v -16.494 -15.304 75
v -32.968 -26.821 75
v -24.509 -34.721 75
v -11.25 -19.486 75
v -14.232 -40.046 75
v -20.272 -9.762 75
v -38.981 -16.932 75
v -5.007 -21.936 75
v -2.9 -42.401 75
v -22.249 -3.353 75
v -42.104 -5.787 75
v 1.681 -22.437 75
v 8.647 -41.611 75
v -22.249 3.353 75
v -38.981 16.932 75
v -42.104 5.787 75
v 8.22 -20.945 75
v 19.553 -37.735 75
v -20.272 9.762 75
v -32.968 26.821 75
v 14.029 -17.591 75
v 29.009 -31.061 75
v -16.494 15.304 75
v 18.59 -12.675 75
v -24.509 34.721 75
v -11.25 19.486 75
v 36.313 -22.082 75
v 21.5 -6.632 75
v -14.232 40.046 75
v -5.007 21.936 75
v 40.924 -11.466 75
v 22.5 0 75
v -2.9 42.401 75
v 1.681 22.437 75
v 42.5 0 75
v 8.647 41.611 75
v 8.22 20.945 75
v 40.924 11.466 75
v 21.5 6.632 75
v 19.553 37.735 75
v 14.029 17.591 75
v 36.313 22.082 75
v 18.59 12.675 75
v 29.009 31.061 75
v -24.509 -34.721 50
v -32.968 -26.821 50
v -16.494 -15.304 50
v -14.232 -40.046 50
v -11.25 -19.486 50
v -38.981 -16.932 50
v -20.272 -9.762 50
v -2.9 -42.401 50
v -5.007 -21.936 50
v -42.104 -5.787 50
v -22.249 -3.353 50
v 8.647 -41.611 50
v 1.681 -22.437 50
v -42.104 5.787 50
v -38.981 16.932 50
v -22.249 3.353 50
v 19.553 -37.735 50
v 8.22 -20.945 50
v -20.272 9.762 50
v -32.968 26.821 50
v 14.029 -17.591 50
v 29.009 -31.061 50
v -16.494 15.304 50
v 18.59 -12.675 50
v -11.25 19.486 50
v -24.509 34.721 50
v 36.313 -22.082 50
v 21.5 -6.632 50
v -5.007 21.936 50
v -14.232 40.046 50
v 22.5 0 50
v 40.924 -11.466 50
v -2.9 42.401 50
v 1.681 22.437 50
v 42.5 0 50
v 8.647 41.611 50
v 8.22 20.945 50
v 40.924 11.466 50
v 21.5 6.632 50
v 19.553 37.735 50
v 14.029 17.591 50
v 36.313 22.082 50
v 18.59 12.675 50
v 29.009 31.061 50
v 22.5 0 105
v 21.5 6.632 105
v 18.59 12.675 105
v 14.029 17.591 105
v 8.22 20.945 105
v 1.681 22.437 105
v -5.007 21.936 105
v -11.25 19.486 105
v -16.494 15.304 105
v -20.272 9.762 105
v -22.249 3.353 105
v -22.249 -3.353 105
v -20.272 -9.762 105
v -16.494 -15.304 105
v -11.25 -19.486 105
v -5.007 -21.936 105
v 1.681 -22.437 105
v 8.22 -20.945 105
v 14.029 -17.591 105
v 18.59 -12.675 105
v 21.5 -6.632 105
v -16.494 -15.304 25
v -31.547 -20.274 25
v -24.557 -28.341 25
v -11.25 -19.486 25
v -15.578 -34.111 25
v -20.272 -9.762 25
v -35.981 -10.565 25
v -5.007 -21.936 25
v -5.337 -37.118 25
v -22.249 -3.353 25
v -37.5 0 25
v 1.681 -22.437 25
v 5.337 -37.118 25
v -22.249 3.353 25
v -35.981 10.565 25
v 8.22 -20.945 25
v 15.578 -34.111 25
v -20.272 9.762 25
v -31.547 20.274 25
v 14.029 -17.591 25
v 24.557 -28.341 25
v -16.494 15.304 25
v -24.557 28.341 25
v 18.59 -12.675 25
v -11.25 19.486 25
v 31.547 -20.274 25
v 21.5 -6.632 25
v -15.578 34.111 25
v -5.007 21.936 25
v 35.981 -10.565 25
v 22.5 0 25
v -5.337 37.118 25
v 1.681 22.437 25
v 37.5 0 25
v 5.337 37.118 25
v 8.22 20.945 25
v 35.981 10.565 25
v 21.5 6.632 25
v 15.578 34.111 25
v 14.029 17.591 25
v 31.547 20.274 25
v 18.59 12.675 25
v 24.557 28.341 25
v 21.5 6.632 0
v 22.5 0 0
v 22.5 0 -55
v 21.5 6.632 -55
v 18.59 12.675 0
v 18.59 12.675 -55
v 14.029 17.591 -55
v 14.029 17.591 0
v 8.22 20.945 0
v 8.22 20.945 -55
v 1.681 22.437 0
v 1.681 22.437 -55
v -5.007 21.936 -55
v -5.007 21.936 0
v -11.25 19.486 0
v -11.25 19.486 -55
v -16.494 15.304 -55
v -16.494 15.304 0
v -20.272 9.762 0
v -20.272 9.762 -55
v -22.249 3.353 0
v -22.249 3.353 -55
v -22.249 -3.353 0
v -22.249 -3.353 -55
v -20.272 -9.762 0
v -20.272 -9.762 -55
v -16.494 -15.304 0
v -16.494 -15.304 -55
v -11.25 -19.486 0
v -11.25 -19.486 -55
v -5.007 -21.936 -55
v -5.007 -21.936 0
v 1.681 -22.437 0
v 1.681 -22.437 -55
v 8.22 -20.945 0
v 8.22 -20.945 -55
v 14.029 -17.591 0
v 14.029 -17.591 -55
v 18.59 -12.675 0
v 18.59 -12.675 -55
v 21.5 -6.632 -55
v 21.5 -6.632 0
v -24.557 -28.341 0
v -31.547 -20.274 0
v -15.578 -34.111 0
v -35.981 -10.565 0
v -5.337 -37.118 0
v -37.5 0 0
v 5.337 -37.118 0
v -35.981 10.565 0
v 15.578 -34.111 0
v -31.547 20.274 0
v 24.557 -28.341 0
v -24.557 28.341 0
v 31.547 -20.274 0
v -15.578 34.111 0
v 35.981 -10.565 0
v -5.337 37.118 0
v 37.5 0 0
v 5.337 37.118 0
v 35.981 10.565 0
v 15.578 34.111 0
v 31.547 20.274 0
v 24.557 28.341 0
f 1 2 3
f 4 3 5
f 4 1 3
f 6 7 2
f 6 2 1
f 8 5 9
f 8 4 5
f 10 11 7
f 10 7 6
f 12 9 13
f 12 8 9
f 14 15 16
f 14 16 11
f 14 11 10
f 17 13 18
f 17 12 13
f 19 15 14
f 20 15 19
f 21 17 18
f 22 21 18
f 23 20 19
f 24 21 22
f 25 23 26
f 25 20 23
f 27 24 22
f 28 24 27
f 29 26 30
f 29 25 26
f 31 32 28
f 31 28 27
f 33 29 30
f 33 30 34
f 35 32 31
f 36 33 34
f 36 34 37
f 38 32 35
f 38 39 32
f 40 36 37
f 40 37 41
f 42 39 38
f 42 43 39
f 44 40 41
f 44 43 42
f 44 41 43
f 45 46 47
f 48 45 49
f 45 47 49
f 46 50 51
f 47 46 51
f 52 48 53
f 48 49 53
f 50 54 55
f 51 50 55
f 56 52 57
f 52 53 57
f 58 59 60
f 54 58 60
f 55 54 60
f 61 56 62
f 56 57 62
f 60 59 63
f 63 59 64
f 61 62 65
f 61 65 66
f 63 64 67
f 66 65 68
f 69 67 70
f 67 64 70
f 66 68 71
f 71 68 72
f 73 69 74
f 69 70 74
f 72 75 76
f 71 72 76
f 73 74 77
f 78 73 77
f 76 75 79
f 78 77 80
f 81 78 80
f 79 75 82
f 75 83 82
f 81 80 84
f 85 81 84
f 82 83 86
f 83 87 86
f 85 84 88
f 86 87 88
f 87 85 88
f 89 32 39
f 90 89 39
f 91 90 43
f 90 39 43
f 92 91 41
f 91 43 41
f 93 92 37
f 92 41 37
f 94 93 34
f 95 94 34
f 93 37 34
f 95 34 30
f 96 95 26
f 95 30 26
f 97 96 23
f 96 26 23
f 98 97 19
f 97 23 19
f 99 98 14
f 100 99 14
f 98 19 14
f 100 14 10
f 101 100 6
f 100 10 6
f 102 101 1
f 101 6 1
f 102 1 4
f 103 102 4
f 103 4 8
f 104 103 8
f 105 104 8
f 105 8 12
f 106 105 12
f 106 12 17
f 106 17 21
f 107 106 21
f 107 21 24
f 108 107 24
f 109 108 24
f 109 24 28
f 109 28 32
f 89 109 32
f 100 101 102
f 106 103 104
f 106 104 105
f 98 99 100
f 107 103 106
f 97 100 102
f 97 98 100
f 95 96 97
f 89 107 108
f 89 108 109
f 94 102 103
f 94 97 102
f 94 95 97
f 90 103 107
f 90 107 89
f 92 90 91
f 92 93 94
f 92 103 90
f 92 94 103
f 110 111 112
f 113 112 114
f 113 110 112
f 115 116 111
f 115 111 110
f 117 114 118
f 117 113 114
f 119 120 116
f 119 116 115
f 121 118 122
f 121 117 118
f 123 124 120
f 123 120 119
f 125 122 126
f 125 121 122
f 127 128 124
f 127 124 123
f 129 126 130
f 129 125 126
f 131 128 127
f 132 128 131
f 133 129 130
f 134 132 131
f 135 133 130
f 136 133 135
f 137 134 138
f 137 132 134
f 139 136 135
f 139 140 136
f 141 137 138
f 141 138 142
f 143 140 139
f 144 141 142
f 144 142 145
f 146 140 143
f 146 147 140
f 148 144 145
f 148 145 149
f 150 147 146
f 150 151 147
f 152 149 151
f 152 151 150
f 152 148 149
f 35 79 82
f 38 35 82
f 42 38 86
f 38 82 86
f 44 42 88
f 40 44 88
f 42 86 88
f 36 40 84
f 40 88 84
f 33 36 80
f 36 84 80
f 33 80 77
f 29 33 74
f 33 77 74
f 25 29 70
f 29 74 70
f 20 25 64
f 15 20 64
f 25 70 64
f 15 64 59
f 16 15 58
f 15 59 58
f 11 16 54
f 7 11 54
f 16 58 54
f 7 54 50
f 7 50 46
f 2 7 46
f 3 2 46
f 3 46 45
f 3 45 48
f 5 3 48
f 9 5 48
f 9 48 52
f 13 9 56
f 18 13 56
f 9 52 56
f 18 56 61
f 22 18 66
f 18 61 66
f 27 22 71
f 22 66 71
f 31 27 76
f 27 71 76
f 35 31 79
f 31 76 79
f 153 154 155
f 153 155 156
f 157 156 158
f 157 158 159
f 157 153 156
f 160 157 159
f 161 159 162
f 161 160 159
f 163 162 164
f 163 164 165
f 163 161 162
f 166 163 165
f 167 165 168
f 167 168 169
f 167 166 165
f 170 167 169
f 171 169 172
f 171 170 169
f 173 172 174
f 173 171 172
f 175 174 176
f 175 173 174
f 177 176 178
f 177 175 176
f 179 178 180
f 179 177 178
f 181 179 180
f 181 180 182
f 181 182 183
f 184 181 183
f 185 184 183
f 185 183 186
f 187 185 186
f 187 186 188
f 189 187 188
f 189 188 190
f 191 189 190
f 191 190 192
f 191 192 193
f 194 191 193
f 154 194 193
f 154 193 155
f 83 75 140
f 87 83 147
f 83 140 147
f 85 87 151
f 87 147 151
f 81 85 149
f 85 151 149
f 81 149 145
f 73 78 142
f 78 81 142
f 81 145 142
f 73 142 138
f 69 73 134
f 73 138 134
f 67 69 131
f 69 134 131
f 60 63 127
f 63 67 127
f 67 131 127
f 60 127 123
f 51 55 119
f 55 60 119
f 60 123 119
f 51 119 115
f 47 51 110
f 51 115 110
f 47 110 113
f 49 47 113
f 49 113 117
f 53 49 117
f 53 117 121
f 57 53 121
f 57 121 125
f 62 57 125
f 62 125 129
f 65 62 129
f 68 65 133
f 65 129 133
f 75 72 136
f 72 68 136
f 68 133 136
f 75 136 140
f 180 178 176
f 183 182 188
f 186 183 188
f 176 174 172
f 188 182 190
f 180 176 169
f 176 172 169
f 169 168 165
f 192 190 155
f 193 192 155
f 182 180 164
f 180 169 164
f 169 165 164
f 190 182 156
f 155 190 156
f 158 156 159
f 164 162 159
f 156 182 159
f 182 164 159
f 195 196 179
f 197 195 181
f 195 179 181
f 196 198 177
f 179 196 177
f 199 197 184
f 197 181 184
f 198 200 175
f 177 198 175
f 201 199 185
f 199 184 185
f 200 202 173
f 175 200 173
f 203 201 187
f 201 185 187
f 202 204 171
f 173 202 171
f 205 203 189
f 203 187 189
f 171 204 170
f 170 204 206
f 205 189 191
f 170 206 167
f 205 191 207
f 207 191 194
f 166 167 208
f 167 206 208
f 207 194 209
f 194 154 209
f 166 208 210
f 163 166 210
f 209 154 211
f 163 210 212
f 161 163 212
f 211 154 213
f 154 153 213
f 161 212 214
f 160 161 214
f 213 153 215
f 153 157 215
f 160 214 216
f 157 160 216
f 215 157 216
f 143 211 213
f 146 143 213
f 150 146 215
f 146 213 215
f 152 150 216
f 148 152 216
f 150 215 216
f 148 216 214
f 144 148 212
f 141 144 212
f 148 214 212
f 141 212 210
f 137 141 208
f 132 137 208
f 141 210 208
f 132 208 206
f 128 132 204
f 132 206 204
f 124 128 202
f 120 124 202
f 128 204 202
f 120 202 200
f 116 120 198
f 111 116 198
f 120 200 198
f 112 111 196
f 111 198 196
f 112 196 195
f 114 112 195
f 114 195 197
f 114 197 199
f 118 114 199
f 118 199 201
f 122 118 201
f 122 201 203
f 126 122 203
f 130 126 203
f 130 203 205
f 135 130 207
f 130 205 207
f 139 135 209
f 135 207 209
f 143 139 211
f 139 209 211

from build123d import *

# Parameters (mm, degrees)
F0_R          = 37.5
F1_DEPTH      = 25
F2_R          = 22.5
F3_DEPTH      = 80
F3_DEPTH_BACK = 80
F5_START      = 25
F4_R          = 42.5
F5_DEPTH      = 25


with BuildPart() as f1:
    # F0 (on Top) → F1 (new body)
    with BuildSketch(Plane.XY):
        Circle(F0_R)
    extrude(amount=F1_DEPTH)

    # F2 (on face) → F3 (join, two sides)
    with BuildSketch(Plane.XY.offset(25)) as f3_sk:
        Circle(F2_R)
    extrude(amount=-F3_DEPTH)
    extrude(f3_sk.sketch, amount=F3_DEPTH_BACK)

    # F4 (on face) → F5 (join)
    with BuildSketch(Plane.XY.offset(25).offset(F5_START)):
        Circle(F4_R)
    extrude(amount=F5_DEPTH)


solid = f1.part
